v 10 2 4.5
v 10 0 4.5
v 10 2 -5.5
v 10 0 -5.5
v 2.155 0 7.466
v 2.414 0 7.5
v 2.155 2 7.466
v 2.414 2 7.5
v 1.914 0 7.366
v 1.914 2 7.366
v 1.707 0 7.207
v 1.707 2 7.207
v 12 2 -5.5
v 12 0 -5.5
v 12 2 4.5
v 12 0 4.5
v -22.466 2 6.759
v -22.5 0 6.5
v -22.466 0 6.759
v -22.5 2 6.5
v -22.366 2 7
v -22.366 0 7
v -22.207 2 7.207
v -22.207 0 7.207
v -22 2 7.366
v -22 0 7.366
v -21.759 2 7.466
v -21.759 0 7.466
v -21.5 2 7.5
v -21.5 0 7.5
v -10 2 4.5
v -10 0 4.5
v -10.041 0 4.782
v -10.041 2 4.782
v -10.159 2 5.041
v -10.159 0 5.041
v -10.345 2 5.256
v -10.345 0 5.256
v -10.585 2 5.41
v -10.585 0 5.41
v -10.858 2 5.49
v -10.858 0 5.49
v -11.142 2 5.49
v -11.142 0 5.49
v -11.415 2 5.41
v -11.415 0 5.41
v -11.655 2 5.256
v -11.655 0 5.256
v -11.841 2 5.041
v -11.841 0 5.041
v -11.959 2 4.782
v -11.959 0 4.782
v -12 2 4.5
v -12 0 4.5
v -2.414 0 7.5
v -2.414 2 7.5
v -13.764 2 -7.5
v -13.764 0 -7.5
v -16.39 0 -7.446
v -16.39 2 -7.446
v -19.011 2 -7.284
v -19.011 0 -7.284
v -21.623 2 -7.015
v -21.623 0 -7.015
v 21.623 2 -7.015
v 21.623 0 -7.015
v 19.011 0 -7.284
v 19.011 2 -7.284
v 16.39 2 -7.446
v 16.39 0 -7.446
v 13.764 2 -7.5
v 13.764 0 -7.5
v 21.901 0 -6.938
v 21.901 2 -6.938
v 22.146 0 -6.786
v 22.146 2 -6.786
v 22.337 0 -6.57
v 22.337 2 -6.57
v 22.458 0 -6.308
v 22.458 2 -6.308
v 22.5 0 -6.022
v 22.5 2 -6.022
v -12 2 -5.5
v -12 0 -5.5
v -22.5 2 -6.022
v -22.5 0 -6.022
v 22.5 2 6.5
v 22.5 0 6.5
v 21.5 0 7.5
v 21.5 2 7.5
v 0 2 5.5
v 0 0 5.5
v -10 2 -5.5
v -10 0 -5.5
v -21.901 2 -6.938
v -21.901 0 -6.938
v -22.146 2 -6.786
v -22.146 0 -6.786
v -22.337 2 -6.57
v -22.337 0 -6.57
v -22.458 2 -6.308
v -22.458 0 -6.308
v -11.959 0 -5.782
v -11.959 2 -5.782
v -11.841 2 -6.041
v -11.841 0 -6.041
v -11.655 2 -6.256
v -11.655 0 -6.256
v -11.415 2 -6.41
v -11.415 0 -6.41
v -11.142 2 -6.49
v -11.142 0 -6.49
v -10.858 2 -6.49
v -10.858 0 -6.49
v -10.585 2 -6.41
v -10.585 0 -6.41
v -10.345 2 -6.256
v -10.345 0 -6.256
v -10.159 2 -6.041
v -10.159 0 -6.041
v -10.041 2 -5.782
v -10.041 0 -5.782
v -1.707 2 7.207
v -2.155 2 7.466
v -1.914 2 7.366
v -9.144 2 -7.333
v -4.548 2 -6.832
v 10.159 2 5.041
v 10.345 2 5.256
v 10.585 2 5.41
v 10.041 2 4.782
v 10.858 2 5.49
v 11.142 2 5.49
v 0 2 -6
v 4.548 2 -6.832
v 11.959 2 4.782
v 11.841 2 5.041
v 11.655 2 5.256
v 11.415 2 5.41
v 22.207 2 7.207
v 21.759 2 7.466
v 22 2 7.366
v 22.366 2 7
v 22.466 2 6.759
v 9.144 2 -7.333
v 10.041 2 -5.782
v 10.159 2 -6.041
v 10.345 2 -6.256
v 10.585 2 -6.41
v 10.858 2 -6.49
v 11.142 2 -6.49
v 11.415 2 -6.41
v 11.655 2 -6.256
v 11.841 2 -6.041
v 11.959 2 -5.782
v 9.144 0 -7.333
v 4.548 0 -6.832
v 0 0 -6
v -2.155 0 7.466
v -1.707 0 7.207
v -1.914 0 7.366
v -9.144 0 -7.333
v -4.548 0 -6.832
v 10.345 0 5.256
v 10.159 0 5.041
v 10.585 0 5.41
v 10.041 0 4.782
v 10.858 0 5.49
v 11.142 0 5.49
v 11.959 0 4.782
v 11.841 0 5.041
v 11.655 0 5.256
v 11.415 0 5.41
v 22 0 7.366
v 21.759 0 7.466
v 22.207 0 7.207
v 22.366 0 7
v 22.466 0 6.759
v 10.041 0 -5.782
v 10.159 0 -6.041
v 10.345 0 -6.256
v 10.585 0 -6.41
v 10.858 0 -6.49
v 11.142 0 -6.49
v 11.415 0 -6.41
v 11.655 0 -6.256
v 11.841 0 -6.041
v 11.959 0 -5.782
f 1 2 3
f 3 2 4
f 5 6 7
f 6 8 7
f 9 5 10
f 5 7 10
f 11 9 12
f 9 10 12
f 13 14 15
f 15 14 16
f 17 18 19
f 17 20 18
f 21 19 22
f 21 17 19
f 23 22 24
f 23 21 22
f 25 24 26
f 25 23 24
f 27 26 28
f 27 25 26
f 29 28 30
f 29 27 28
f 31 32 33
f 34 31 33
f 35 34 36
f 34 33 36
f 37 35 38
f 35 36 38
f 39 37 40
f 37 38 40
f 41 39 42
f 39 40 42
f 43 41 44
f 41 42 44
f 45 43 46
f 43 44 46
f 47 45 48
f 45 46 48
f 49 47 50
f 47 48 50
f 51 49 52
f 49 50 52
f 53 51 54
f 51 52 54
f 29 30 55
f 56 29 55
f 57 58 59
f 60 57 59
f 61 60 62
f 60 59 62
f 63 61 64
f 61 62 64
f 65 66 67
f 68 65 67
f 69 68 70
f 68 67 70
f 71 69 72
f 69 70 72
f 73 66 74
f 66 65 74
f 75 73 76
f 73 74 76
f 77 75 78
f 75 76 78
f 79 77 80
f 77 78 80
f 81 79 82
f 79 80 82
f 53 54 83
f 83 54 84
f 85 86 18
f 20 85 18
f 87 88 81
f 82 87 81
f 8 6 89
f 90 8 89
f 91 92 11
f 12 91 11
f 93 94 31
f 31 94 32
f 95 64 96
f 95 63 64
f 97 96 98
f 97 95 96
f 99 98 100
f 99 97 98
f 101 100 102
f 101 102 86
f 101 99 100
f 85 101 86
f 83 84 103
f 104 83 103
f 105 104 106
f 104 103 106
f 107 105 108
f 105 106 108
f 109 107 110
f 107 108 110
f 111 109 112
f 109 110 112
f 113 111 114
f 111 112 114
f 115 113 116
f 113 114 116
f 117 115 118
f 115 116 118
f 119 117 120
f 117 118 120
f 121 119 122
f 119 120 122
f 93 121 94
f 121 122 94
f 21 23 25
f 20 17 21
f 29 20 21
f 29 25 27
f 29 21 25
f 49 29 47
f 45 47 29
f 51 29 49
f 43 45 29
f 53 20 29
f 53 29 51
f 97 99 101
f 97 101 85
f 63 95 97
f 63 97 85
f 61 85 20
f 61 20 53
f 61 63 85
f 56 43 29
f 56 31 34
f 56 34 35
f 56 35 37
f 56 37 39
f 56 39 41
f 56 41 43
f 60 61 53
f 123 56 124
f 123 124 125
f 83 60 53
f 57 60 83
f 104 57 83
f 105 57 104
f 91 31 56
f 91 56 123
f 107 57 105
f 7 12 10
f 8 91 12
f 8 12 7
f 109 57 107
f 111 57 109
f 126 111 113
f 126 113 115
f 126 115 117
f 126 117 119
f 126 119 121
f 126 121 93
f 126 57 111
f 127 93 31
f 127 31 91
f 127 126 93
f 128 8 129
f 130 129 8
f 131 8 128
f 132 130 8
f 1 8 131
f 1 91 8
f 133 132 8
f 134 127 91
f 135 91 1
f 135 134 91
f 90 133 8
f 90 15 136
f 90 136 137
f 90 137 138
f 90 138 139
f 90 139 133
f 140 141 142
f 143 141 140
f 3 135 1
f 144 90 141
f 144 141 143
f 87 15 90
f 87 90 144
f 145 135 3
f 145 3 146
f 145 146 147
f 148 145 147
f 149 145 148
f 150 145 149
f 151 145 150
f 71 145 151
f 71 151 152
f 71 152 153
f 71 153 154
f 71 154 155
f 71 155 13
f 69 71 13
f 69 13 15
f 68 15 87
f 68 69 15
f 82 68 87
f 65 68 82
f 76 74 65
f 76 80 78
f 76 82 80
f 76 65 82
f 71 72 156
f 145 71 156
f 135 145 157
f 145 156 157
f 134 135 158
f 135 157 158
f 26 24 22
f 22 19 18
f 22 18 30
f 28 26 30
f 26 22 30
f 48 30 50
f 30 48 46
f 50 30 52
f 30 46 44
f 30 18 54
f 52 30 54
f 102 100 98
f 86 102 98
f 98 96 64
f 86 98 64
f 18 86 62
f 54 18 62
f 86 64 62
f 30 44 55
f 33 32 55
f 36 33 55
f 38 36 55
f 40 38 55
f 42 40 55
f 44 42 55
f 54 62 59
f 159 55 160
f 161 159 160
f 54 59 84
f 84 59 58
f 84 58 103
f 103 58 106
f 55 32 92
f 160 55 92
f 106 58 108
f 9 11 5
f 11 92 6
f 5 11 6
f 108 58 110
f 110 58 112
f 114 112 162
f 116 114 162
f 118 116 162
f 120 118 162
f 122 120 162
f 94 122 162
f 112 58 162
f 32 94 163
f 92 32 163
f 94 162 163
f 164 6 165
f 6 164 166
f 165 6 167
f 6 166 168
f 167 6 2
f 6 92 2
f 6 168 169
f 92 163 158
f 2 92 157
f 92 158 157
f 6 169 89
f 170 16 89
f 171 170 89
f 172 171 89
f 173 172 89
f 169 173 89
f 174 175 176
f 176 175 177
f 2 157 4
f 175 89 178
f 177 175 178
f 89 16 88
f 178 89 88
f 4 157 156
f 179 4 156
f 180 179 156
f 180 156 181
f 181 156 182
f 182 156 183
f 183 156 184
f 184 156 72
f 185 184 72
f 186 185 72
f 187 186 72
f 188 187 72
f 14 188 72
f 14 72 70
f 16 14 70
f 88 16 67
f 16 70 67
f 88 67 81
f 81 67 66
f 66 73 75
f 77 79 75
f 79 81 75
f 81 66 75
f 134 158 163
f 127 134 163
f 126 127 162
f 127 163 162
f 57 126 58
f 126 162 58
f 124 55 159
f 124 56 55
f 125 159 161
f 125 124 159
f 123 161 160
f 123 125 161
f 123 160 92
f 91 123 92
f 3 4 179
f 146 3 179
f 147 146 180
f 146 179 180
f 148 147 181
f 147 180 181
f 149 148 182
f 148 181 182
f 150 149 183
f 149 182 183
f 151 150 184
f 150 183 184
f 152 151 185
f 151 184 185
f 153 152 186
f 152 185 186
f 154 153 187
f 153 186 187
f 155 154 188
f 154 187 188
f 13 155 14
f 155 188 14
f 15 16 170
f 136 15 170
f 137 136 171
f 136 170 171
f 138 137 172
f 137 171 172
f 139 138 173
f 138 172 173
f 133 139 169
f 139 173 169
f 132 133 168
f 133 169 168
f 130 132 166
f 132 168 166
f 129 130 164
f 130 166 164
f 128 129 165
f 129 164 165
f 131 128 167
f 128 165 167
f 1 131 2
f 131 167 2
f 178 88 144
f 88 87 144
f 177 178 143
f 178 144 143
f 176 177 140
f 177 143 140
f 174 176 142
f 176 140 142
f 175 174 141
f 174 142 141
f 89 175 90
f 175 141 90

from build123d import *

# Parameters (mm, degrees)
RESSALTO_EXTRUS_O1_DEPTH = 2
FILETE1_R                = 1


with BuildPart() as part:
    # Esboço1 → Ressalto-extrusão1 (new body)
    with BuildSketch(Plane(origin=(0, 0, 0), x_dir=(1, 0, 0), z_dir=(0, 1, 0))):
        with BuildLine():
            ThreePointArc((0, 6), (-6.841228784, 7.123893127), (-13.763951561, 7.5))
            ThreePointArc((-13.763951561, 7.5), (-18.1422658, 7.349823523), (-22.5, 6.9))
            Line((-22.5, 6.9), (-22.5, -7.5))
            Line((-22.5, -7.5), (-2, -7.5))
            Line((-2, -7.5), (0, -5.5))
            Line((0, -5.5), (2, -7.5))
            Line((2, -7.5), (22.5, -7.5))
            Line((22.5, -7.5), (22.5, 6.9))
            ThreePointArc((22.5, 6.9), (18.1422658, 7.349823523), (13.763951559, 7.5))
            ThreePointArc((13.763951559, 7.5), (6.841228783, 7.123893127), (0, 6))
        make_face()
        with BuildLine():
            ThreePointArc((-12, 5.5), (-11, 6.5), (-10, 5.5))
            Line((-10, 5.5), (-10, -4.5))
            ThreePointArc((-10, -4.5), (-11, -5.5), (-12, -4.5))
            Line((-12, -4.5), (-12, 5.5))
        make_face(mode=Mode.SUBTRACT)
        with BuildLine():
            Line((10, -4.5), (10, 5.5))
            ThreePointArc((10, 5.5), (11, 6.5), (12, 5.5))
            Line((12, 5.5), (12, -4.5))
            ThreePointArc((12, -4.5), (11, -5.5), (10, -4.5))
        make_face(mode=Mode.SUBTRACT)
    extrude(amount=RESSALTO_EXTRUS_O1_DEPTH)

    # Filete1
    filete1_edges = [part.edges().sort_by_distance(p)[0] for p in [
        (22.5, 1, -6.9),
        (22.5, 1, 7.5),
        (2, 1, 7.5),
        (-2, 1, 7.5),
        (-22.5, 1, 7.5),
        (-22.5, 1, -6.9),
    ]]
    fillet(filete1_edges, radius=FILETE1_R)


solid = part.part
